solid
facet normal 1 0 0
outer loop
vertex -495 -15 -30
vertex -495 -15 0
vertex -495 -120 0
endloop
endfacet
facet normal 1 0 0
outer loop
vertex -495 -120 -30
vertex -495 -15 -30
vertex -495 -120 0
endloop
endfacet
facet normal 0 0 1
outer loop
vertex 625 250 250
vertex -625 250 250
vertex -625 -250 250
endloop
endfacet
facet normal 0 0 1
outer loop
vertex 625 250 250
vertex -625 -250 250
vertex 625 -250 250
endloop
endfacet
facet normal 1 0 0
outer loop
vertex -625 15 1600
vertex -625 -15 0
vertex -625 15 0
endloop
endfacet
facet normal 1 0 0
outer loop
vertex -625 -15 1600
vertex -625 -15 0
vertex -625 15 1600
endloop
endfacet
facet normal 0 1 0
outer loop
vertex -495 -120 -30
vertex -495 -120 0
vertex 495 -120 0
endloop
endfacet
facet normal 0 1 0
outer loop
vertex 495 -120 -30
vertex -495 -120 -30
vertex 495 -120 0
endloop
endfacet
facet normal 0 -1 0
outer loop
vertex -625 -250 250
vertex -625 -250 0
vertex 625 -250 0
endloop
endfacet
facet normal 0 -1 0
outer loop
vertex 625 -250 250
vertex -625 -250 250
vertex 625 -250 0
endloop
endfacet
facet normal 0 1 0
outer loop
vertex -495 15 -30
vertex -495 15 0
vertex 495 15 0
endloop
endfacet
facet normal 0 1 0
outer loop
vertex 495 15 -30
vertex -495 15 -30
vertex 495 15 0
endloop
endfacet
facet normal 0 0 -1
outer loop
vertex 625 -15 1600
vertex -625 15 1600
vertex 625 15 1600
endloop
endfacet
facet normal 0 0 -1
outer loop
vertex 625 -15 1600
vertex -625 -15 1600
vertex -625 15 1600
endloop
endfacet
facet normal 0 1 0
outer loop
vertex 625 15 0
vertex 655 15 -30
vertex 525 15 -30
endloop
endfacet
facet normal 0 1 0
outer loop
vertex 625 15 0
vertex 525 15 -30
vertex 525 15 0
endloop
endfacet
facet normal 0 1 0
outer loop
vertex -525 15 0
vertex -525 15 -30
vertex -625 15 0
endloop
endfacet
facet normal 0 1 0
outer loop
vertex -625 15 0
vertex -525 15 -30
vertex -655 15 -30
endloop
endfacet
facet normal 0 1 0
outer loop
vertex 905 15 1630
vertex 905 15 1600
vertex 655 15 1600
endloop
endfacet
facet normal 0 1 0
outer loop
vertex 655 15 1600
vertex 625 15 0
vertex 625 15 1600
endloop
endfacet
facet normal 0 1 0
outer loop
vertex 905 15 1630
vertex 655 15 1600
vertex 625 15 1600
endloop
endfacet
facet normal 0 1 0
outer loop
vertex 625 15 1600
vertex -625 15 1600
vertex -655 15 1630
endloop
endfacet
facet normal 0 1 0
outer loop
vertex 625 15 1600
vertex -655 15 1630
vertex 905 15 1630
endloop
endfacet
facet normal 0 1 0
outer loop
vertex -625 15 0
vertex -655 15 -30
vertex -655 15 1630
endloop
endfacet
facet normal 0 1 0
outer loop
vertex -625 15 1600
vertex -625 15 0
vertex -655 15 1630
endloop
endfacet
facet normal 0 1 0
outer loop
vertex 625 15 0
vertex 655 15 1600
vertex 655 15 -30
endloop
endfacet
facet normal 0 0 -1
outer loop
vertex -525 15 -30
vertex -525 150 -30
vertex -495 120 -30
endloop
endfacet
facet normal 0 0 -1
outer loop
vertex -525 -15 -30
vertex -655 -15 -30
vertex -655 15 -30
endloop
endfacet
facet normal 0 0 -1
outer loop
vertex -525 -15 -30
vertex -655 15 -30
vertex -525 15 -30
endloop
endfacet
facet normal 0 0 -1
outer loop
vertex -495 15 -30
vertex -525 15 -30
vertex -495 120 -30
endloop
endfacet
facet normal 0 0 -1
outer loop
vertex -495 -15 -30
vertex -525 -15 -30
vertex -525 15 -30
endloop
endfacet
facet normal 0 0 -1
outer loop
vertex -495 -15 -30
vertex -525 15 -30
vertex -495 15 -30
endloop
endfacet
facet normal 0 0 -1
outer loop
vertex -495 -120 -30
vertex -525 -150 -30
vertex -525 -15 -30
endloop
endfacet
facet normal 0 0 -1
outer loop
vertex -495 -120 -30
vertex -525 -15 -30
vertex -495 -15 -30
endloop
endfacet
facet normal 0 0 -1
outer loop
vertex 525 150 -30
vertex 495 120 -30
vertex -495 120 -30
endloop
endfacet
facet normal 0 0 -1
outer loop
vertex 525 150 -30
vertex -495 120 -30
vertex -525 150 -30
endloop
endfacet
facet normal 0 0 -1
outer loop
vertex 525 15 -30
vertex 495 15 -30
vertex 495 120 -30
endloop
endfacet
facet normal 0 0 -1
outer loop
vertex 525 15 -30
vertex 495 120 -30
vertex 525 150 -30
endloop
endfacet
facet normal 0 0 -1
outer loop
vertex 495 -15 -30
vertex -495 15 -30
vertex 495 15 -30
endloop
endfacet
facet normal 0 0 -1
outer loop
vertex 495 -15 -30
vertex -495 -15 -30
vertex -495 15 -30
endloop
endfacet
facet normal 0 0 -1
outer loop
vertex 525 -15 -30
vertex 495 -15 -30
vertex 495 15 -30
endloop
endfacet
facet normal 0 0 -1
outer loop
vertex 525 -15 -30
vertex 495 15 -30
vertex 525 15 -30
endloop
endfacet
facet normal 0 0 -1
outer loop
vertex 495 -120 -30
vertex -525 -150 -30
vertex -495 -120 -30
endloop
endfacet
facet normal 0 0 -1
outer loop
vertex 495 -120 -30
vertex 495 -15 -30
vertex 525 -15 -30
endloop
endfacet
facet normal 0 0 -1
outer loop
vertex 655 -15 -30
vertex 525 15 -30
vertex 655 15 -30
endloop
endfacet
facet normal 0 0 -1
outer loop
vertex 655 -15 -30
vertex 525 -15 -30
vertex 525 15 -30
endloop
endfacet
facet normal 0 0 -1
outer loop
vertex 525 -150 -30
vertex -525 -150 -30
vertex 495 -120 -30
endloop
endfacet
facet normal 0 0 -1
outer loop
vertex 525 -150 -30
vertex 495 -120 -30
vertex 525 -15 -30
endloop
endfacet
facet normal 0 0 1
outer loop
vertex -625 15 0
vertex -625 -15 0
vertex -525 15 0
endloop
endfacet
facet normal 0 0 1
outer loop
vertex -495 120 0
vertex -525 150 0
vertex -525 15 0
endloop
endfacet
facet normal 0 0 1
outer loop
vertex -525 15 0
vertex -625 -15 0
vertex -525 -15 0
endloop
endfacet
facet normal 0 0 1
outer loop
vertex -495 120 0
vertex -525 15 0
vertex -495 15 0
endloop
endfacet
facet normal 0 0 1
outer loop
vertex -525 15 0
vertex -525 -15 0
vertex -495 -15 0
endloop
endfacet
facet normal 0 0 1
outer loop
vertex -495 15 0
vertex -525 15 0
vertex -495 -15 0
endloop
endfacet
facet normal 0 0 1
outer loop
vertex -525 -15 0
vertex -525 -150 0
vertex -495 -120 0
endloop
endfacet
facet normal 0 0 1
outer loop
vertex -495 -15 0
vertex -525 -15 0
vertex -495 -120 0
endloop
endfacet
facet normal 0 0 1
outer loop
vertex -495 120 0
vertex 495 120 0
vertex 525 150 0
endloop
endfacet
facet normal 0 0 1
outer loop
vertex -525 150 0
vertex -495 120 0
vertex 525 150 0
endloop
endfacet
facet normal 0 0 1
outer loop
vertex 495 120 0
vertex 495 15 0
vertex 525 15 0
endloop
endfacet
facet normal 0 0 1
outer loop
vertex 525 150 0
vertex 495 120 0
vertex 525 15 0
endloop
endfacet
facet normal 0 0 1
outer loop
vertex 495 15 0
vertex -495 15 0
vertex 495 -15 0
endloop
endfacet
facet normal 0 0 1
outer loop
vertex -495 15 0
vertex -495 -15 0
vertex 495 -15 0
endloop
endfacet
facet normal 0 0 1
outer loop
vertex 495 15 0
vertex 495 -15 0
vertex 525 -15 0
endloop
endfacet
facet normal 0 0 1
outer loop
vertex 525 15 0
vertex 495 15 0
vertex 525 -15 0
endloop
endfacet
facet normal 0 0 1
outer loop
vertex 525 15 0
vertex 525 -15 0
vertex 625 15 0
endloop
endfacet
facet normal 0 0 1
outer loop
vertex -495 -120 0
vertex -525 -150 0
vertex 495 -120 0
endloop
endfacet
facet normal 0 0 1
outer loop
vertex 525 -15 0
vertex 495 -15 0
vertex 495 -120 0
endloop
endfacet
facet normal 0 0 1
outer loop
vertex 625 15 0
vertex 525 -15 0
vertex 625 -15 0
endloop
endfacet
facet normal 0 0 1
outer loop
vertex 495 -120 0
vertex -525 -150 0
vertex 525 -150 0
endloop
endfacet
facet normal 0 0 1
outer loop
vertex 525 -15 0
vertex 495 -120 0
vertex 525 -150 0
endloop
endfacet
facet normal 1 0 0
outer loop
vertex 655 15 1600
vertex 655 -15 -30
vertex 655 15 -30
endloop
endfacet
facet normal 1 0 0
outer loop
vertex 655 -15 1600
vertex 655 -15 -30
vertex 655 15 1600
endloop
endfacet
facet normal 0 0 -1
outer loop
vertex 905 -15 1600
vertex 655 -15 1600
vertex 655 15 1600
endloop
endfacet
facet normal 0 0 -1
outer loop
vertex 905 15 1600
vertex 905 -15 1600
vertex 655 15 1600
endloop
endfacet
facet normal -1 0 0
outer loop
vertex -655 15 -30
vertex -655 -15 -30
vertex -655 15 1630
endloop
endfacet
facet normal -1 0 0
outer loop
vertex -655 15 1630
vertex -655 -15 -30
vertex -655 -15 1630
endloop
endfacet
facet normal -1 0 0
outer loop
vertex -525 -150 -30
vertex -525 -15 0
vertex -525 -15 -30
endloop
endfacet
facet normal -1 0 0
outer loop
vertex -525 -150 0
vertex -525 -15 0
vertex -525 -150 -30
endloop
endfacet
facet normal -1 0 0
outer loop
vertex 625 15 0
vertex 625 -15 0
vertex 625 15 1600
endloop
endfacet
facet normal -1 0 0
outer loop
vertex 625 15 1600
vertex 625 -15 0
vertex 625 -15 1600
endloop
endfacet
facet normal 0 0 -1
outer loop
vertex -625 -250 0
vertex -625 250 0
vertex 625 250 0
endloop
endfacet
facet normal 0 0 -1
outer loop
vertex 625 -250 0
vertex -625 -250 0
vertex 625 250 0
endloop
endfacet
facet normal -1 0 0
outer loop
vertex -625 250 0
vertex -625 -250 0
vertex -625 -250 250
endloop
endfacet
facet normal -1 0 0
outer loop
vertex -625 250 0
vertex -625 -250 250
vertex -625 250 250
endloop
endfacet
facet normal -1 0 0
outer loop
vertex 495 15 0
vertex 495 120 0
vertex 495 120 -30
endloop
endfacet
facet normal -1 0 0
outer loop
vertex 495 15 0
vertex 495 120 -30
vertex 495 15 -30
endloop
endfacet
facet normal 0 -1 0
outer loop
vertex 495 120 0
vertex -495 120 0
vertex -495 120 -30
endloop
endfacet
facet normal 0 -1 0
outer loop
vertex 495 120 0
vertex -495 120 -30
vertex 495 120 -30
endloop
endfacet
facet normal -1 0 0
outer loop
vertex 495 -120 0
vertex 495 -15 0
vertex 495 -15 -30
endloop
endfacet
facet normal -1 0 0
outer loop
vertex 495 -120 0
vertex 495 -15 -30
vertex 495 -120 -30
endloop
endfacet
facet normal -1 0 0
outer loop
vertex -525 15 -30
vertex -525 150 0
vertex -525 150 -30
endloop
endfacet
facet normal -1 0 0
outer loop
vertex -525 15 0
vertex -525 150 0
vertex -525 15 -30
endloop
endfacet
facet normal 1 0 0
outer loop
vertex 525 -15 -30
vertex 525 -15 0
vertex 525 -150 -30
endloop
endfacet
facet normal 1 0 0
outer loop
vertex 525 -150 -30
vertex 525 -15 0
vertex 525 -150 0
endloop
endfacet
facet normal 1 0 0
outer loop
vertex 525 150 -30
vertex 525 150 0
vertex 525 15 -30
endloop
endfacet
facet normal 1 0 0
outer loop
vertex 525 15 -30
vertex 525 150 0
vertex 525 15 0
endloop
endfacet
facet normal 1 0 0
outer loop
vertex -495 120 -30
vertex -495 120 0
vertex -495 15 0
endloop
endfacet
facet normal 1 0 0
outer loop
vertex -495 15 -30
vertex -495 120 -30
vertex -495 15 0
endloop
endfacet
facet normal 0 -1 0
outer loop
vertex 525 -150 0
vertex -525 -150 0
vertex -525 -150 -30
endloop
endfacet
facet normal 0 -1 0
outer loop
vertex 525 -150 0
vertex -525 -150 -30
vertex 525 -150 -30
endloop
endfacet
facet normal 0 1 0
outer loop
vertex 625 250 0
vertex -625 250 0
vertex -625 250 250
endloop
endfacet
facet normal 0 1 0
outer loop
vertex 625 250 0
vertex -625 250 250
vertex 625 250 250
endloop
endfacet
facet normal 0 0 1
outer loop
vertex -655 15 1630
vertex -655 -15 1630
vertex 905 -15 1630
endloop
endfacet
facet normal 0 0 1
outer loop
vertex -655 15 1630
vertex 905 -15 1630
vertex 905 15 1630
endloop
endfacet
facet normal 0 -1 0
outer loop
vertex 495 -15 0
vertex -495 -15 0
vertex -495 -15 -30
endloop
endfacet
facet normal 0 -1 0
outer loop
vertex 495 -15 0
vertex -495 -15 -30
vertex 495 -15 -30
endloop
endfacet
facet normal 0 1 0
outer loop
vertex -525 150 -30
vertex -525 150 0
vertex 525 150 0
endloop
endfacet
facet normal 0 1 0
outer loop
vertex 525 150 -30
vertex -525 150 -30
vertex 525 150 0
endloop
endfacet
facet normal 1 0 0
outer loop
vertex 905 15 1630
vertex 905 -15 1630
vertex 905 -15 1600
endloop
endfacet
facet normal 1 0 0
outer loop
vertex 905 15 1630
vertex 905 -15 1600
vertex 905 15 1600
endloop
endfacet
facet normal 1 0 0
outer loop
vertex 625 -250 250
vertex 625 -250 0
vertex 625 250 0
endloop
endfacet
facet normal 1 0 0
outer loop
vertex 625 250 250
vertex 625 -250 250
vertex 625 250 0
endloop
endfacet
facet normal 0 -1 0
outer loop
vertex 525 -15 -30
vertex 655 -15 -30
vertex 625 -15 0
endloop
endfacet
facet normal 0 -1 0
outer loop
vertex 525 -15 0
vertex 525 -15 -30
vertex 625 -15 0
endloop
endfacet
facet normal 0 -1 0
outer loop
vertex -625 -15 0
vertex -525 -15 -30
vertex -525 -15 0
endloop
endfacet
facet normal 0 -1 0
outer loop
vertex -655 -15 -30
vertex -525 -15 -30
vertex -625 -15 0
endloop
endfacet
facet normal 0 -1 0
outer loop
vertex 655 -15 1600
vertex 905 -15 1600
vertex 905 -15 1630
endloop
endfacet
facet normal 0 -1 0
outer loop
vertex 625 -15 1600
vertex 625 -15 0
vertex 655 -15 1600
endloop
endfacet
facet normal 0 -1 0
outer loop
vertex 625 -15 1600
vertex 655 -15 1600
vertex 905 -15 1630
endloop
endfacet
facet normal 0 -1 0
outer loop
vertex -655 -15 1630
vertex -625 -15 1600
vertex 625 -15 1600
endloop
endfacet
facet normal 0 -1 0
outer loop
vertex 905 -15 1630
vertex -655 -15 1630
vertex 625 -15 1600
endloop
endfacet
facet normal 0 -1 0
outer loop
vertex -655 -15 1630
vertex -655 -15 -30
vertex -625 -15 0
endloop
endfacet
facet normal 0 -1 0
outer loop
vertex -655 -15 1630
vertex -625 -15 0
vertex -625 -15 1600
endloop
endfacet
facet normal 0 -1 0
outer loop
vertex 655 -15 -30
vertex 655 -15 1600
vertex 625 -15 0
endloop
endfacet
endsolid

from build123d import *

# Parameters (mm, degrees)
F0_W     = 1250
F0_H     = 500
F1_DEPTH = 250
F2_W     = 1310
F2_H     = 1660
F2_W_2   = 1250
F2_H_2   = 1600
F3_DEPTH = 15
F4_W     = 1050
F4_H     = 300
F4_W_2   = 990
F4_H_2   = 240
F5_DEPTH = 30
F6_W     = 30
F6_H     = 30
F7_DEPTH = 250


with BuildPart() as f1:
    # F0 (on Top) → F1 (new body)
    with BuildSketch(Plane.XY):
        Rectangle(F0_W, F0_H)
    extrude(amount=F1_DEPTH)


with BuildPart() as f3:
    # F2 (on Front) → F3 (new body, symmetric)
    with BuildSketch(Plane.XZ):
        with Locations((0, 800)):
            Rectangle(F2_W, F2_H)
        with Locations((0, 800)):
            Rectangle(F2_W_2, F2_H_2, mode=Mode.SUBTRACT)
    extrude(amount=F3_DEPTH, both=True)

    # F4 (on face) → F5 (join)
    with BuildSketch(Plane(origin=(0, 0, 0), x_dir=(1, 0, 0), z_dir=(0, 0, -1))):
        Rectangle(F4_W, F4_H)
        Rectangle(F4_W_2, F4_H_2, mode=Mode.SUBTRACT)
    extrude(amount=F5_DEPTH)

    # F6 (on face) → F7 (join)
    with BuildSketch(Plane.YZ.offset(655)):
        with Locations((0, 1615)):
            Rectangle(F6_W, F6_H)
    extrude(amount=F7_DEPTH)


solid = Compound([f1.part, f3.part])
